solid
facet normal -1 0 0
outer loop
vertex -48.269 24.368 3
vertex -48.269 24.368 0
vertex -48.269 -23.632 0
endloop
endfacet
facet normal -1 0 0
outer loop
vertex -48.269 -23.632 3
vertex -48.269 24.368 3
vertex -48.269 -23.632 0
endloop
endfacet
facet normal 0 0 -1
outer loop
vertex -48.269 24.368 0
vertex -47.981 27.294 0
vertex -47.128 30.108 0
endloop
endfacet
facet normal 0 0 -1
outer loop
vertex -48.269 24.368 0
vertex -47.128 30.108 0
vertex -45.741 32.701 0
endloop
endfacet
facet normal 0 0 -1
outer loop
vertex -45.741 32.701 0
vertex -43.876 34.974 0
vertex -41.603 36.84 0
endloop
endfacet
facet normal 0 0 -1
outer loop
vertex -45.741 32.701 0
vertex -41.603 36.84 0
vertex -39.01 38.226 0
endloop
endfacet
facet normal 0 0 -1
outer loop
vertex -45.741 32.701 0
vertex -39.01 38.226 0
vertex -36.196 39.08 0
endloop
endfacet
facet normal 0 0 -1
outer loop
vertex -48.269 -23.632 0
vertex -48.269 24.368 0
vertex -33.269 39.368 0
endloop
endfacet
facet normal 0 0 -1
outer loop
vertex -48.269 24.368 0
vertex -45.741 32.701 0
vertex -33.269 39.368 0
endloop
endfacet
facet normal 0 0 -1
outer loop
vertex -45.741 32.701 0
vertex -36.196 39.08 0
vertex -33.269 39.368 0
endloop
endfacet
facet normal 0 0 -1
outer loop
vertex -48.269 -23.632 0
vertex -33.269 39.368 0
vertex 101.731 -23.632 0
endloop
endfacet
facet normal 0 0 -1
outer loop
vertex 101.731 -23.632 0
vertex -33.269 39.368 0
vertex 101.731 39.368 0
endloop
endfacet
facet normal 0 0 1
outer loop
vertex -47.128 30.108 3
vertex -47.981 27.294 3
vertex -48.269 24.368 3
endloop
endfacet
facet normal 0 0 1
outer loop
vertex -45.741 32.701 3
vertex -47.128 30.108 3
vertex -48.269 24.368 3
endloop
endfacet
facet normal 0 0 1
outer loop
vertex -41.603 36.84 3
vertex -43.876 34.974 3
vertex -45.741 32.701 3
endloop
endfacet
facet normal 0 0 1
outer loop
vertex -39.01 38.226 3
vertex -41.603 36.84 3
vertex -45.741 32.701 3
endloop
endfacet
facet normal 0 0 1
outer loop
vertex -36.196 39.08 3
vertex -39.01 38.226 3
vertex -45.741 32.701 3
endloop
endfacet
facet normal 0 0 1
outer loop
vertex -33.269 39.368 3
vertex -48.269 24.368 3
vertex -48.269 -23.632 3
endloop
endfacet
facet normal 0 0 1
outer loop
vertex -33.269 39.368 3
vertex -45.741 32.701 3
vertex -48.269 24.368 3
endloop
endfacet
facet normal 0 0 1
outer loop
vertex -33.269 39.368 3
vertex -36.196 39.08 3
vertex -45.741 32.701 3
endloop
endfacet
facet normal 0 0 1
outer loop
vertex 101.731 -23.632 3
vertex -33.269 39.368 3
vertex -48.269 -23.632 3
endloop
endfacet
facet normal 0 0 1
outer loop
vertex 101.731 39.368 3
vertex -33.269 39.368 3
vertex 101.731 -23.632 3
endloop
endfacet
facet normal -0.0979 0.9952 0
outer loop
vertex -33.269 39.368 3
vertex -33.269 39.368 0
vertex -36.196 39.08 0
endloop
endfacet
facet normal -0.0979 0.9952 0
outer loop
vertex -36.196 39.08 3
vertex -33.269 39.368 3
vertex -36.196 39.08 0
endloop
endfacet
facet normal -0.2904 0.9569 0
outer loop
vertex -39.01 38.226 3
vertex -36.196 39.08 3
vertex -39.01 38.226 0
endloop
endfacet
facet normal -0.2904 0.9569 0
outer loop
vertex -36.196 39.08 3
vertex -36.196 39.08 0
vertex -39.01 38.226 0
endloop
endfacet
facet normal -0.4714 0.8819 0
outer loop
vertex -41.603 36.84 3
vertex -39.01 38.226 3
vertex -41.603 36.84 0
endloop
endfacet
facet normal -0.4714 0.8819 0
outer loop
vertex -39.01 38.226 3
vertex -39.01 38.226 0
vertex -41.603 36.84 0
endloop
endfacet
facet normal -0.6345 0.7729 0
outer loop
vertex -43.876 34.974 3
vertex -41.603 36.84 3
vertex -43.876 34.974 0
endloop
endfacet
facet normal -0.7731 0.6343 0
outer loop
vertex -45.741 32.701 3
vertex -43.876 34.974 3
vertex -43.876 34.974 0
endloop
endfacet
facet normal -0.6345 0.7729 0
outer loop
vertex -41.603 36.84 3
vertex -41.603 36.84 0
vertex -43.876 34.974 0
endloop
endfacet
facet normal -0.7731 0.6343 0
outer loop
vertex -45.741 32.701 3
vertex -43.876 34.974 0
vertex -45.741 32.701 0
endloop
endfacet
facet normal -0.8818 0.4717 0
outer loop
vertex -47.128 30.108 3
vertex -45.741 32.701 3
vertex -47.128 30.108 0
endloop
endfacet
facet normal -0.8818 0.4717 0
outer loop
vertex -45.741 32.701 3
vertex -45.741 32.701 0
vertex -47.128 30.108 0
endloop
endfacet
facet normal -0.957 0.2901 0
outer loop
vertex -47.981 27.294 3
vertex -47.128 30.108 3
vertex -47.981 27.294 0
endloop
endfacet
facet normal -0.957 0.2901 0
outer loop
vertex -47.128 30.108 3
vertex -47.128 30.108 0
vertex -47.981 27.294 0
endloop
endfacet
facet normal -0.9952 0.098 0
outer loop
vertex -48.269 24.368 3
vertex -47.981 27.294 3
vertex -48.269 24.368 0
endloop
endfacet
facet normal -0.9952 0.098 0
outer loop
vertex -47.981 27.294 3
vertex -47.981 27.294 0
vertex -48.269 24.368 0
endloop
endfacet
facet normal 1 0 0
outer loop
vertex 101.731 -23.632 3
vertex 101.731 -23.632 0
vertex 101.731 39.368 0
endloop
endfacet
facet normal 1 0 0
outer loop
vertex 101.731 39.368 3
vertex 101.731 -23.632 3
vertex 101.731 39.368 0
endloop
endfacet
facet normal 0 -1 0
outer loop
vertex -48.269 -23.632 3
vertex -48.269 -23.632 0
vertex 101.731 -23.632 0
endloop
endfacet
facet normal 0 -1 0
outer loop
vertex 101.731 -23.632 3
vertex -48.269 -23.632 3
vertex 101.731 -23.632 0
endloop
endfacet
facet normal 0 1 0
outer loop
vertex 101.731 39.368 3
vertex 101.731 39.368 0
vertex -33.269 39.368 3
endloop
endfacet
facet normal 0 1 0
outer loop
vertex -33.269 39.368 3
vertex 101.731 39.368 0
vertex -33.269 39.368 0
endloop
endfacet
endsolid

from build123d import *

# Parameters (mm, degrees)
F1_DEPTH = 3


with BuildPart() as f1:
    # F0 (on Top) → F1 (new body)
    with BuildSketch(Plane.XY):
        with BuildLine():
            Line((101.730692, 39.367754), (-33.269308, 39.367754))
            ThreePointArc((-33.269308, 39.367754), (-43.87591, 34.974356), (-48.269308, 24.367754))
            Line((-48.269308, 24.367754), (-48.269308, -23.632246))
            Line((-48.269308, -23.632246), (101.730692, -23.632246))
            Line((101.730692, -23.632246), (101.730692, 39.367754))
        make_face()
    extrude(amount=F1_DEPTH)


solid = f1.part
